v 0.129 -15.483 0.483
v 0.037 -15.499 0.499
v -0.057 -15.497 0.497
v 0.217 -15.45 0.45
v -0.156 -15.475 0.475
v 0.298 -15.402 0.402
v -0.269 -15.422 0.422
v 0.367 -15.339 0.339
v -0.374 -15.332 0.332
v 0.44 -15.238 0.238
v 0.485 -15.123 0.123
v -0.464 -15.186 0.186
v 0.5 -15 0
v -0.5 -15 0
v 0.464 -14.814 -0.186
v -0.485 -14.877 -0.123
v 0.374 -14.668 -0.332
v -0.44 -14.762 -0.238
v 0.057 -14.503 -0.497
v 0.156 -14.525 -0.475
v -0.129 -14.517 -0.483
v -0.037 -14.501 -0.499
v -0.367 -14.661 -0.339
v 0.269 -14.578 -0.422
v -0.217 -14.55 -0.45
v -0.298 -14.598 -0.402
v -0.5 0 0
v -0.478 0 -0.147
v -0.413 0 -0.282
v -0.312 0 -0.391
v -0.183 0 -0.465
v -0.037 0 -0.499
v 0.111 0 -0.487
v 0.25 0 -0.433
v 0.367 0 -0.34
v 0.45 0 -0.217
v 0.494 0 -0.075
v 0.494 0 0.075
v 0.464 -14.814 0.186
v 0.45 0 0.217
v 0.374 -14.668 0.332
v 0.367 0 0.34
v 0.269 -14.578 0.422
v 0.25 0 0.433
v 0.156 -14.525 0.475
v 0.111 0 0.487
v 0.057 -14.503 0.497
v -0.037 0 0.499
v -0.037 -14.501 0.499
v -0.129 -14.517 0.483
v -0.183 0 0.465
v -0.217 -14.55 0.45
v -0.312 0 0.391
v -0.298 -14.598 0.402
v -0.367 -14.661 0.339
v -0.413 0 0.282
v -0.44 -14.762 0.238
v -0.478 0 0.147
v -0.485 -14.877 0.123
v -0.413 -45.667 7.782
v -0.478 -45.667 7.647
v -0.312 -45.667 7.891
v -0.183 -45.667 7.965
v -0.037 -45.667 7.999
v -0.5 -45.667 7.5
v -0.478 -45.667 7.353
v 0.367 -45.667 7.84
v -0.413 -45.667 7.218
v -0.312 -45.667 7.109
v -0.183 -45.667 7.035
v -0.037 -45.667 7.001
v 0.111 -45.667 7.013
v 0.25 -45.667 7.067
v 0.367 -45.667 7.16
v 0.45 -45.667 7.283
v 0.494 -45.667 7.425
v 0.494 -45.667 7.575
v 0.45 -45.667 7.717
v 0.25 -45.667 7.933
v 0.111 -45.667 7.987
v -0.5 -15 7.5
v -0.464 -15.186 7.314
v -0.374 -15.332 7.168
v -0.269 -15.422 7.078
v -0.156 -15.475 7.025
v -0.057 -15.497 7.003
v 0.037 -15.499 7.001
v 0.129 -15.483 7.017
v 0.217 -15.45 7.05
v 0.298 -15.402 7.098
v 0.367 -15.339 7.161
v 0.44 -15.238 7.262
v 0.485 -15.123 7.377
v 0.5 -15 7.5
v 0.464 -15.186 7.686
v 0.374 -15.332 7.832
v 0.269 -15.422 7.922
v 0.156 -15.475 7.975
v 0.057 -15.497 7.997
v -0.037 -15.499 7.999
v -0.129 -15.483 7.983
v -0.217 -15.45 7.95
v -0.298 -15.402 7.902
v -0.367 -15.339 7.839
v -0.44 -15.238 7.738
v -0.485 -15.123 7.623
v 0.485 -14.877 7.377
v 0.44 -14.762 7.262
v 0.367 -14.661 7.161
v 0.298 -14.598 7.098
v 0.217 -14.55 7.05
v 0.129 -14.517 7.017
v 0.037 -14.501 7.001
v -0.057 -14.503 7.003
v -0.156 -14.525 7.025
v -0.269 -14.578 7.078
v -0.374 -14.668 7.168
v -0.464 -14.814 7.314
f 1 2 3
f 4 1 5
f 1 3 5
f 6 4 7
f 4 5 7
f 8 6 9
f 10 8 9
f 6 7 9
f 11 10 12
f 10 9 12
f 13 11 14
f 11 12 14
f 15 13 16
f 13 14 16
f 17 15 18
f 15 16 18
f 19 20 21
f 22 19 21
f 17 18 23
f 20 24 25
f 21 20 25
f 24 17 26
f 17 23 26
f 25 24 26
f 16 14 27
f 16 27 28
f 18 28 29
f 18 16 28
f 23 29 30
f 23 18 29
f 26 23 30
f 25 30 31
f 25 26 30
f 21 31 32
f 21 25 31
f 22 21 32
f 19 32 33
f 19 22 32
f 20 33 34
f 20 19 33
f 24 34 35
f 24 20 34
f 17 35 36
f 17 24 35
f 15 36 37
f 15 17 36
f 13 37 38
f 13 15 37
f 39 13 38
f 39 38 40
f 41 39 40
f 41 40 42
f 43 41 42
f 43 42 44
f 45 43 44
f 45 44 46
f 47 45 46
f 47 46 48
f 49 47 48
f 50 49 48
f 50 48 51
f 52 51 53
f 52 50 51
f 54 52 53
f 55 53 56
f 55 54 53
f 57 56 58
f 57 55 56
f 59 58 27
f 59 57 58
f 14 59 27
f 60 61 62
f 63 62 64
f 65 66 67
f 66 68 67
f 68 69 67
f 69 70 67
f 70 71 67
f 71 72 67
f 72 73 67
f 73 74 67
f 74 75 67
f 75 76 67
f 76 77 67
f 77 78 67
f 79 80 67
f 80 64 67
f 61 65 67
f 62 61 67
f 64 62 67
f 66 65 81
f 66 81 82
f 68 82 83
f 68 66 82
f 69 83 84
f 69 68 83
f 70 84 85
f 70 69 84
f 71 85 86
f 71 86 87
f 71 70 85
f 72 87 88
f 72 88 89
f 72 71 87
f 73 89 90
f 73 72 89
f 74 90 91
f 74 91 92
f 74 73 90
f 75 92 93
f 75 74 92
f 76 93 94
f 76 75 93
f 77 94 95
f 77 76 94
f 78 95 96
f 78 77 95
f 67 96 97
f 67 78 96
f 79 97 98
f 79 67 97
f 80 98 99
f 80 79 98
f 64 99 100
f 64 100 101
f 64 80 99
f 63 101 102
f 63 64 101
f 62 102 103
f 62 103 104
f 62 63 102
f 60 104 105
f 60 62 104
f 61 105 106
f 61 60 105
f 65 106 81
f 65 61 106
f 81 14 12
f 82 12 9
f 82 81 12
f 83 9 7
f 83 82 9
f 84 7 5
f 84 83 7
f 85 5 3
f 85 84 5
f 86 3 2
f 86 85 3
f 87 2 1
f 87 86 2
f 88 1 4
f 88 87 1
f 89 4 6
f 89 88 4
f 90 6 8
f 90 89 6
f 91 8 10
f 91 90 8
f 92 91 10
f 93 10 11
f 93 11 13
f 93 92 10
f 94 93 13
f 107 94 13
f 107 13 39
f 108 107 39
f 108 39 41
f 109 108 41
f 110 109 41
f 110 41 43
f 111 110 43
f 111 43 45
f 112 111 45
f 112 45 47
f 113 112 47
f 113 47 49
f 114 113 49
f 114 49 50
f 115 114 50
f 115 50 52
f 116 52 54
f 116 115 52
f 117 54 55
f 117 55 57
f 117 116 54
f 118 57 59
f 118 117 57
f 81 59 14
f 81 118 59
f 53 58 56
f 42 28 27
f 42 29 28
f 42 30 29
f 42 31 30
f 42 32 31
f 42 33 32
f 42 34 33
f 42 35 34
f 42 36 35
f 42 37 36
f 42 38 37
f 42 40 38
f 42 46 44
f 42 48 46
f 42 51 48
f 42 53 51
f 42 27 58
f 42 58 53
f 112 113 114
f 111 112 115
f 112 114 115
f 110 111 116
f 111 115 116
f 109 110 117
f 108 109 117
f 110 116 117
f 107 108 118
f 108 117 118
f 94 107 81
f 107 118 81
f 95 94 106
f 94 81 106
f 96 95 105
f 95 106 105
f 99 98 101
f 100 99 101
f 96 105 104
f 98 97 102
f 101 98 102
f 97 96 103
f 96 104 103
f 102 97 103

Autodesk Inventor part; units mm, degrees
ref_plane "YZ Plane" through (0, 0, 0) normal (1, 0, 0) x (0, 1, 0)
ref_plane "XZ Plane" through (0, 0, 0) normal (0, 1, 0) x (-1, 0, 0)
ref_plane "XY Plane" through (0, 0, 0) normal (0, 0, 1) x (1, 0, 0)
sketch "Skizze1" plane through (0, 0, 0) normal (1, 0, 0) x (0, 1, 0)
  line L0 (0, 0) -> (-15, 0)
  line L1 (-15, 0) -> (-15, 7.5)
  line L2 (-15, 7.5) -> (-45.667, 7.5)
  dimension "d0" = 15
  dimension "d1" = 7.5
sketch "Skizze2" plane through (0, 0, 0) normal (0, 1, 0) x (-1, 0, 0)
  circle A0 centre (0, 0) radius 0.5
  dimension "d2" = 1
sweep "Sweeping1" add profiles "Skizze2" path "Skizze1"
sketch "Skizze3" plane through (0, 0, 0) normal (1, 0, 0) x (0, 1, 0)
  line L0 (-14.5, 0.5) -> (-14.5, 8) projected
  line L1 (-15.5, -0.5) -> (-15.5, 7) projected
  line L2 (-13.783, 17.8624) -> (-5.8155, 9.8948)
  line L3 (-5.8155, 9.8948) -> (-11.6052, 4.1052)
  line L4 (-11.6052, 4.1052) -> (-19.5727, 12.0727)
  line L5 (-19.5727, 12.0727) -> (-13.783, 17.8624)
  line L6 (-13.783, 17.8624) -> (-11.6052, 4.1052) construction
  line L7 (-5.8155, 9.8948) -> (-19.5727, 12.0727) construction
  line L8 (-13.783, 17.8624) -> (-2.5152, 17.8624) construction
  line L9 (-14.4975, -10.7606) -> (-21.8094, -3.4488)
  line L10 (-21.8094, -3.4488) -> (-16.6803, 1.6803)
  line L11 (-16.6803, 1.6803) -> (-9.3684, -5.6316)
  line L12 (-9.3684, -5.6316) -> (-14.4975, -10.7606)
  line L13 (-14.4975, -10.7606) -> (-16.6803, 1.6803) construction
  line L14 (-21.8094, -3.4488) -> (-9.3684, -5.6316) construction
  point P0 (0, 0)
  point P1 (-12.6941, 10.9838)
  point P2 (-15.5889, -4.5402)
  dimension "d5" = 45
extrude "Extrusion1" cut sketch "Skizze3" along normal through all both and the other way through all
properties part number "00_Beam_Stairs_7.5mm"
